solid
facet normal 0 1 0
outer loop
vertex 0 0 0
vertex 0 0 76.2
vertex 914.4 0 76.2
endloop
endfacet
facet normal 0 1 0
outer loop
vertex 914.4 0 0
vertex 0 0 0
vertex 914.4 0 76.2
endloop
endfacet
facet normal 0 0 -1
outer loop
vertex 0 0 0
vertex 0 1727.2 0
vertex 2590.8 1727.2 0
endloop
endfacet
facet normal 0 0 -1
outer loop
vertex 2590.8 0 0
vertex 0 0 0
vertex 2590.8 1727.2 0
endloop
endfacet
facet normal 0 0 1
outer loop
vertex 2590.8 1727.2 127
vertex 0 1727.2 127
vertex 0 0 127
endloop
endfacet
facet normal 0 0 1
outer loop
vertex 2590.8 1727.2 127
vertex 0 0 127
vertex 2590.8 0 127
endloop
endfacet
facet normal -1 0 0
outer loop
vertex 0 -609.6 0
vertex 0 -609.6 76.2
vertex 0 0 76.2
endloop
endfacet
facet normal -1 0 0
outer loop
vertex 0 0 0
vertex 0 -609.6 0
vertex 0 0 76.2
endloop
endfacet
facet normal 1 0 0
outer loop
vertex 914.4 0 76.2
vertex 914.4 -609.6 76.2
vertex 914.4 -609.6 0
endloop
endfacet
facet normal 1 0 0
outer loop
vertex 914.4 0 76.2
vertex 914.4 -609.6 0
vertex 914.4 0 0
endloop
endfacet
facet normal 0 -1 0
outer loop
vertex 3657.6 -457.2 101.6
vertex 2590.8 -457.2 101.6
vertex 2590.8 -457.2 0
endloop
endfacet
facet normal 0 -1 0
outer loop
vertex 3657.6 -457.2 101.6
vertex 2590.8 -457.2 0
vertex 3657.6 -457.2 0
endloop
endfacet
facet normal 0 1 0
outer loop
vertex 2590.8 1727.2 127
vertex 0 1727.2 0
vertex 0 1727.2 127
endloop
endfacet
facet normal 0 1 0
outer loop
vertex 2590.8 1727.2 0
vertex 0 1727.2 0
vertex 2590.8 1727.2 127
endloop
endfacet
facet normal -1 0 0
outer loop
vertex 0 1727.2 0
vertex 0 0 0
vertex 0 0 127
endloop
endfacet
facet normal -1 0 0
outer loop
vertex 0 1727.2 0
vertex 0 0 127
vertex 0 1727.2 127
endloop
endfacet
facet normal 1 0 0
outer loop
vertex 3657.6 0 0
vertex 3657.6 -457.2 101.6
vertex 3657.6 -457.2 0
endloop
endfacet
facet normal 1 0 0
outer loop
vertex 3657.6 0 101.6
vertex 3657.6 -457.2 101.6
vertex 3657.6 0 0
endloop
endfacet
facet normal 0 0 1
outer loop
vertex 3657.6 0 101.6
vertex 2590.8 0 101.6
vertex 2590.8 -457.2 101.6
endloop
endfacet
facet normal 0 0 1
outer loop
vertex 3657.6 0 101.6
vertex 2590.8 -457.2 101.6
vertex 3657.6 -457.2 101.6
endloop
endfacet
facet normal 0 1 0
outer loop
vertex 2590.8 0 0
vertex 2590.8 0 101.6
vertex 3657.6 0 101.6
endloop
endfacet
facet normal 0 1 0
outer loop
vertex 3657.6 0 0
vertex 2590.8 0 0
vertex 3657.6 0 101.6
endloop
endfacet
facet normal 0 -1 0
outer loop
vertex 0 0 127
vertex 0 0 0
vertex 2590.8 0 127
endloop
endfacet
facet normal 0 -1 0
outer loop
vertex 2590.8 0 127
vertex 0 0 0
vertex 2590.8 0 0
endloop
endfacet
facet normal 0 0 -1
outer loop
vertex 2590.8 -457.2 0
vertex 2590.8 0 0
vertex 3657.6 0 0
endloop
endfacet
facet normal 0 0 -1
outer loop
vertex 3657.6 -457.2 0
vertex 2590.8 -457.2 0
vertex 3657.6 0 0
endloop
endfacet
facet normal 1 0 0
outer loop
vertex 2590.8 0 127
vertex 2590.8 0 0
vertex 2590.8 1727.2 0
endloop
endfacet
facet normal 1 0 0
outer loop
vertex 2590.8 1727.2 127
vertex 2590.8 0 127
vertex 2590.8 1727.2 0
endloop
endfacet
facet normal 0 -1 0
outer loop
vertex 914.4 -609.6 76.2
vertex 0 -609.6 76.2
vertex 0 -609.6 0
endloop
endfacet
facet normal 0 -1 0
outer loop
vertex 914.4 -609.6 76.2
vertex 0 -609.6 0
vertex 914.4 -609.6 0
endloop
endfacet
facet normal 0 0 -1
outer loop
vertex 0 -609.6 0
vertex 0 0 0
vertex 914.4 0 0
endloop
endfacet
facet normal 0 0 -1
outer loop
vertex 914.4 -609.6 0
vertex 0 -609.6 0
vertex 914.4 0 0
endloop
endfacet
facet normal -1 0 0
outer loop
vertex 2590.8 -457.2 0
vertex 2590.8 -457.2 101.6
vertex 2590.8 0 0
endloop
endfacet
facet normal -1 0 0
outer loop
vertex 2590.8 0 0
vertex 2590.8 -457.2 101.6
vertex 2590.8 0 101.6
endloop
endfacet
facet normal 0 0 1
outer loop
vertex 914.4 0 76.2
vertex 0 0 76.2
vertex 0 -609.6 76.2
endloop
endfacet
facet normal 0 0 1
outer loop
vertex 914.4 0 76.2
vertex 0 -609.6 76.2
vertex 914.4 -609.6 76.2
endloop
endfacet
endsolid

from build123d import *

# Parameters (mm, degrees)
F0_W     = 2590.8
F0_H     = 1727.2
F1_DEPTH = 127
F3_START = -25.4
F2_W     = 1066.8
F2_H     = 457.2
F3_DEPTH = 101.6
F5_START = -50.8
F4_W     = 914.4
F4_H     = 609.6
F5_DEPTH = 76.2


with BuildPart() as f1:
    # F0 (on Top) → F1 (new body)
    with BuildSketch(Plane.XY):
        with Locations((1295.4, 863.6)):
            Rectangle(F0_W, F0_H)
    extrude(amount=F1_DEPTH)


with BuildPart() as f3:
    # F2 (on face) → F3 (new body)
    with BuildSketch(Plane.XY.offset(127).offset(F3_START)):
        with Locations((3124.2, -228.6)):
            Rectangle(F2_W, F2_H)
    extrude(amount=-F3_DEPTH)


with BuildPart() as f5:
    # F4 (on face) → F5 (new body)
    with BuildSketch(Plane.XY.offset(127).offset(F5_START)):
        with Locations((457.2, -304.8)):
            Rectangle(F4_W, F4_H)
    extrude(amount=-F5_DEPTH)


solid = Compound([f1.part, f3.part, f5.part])
